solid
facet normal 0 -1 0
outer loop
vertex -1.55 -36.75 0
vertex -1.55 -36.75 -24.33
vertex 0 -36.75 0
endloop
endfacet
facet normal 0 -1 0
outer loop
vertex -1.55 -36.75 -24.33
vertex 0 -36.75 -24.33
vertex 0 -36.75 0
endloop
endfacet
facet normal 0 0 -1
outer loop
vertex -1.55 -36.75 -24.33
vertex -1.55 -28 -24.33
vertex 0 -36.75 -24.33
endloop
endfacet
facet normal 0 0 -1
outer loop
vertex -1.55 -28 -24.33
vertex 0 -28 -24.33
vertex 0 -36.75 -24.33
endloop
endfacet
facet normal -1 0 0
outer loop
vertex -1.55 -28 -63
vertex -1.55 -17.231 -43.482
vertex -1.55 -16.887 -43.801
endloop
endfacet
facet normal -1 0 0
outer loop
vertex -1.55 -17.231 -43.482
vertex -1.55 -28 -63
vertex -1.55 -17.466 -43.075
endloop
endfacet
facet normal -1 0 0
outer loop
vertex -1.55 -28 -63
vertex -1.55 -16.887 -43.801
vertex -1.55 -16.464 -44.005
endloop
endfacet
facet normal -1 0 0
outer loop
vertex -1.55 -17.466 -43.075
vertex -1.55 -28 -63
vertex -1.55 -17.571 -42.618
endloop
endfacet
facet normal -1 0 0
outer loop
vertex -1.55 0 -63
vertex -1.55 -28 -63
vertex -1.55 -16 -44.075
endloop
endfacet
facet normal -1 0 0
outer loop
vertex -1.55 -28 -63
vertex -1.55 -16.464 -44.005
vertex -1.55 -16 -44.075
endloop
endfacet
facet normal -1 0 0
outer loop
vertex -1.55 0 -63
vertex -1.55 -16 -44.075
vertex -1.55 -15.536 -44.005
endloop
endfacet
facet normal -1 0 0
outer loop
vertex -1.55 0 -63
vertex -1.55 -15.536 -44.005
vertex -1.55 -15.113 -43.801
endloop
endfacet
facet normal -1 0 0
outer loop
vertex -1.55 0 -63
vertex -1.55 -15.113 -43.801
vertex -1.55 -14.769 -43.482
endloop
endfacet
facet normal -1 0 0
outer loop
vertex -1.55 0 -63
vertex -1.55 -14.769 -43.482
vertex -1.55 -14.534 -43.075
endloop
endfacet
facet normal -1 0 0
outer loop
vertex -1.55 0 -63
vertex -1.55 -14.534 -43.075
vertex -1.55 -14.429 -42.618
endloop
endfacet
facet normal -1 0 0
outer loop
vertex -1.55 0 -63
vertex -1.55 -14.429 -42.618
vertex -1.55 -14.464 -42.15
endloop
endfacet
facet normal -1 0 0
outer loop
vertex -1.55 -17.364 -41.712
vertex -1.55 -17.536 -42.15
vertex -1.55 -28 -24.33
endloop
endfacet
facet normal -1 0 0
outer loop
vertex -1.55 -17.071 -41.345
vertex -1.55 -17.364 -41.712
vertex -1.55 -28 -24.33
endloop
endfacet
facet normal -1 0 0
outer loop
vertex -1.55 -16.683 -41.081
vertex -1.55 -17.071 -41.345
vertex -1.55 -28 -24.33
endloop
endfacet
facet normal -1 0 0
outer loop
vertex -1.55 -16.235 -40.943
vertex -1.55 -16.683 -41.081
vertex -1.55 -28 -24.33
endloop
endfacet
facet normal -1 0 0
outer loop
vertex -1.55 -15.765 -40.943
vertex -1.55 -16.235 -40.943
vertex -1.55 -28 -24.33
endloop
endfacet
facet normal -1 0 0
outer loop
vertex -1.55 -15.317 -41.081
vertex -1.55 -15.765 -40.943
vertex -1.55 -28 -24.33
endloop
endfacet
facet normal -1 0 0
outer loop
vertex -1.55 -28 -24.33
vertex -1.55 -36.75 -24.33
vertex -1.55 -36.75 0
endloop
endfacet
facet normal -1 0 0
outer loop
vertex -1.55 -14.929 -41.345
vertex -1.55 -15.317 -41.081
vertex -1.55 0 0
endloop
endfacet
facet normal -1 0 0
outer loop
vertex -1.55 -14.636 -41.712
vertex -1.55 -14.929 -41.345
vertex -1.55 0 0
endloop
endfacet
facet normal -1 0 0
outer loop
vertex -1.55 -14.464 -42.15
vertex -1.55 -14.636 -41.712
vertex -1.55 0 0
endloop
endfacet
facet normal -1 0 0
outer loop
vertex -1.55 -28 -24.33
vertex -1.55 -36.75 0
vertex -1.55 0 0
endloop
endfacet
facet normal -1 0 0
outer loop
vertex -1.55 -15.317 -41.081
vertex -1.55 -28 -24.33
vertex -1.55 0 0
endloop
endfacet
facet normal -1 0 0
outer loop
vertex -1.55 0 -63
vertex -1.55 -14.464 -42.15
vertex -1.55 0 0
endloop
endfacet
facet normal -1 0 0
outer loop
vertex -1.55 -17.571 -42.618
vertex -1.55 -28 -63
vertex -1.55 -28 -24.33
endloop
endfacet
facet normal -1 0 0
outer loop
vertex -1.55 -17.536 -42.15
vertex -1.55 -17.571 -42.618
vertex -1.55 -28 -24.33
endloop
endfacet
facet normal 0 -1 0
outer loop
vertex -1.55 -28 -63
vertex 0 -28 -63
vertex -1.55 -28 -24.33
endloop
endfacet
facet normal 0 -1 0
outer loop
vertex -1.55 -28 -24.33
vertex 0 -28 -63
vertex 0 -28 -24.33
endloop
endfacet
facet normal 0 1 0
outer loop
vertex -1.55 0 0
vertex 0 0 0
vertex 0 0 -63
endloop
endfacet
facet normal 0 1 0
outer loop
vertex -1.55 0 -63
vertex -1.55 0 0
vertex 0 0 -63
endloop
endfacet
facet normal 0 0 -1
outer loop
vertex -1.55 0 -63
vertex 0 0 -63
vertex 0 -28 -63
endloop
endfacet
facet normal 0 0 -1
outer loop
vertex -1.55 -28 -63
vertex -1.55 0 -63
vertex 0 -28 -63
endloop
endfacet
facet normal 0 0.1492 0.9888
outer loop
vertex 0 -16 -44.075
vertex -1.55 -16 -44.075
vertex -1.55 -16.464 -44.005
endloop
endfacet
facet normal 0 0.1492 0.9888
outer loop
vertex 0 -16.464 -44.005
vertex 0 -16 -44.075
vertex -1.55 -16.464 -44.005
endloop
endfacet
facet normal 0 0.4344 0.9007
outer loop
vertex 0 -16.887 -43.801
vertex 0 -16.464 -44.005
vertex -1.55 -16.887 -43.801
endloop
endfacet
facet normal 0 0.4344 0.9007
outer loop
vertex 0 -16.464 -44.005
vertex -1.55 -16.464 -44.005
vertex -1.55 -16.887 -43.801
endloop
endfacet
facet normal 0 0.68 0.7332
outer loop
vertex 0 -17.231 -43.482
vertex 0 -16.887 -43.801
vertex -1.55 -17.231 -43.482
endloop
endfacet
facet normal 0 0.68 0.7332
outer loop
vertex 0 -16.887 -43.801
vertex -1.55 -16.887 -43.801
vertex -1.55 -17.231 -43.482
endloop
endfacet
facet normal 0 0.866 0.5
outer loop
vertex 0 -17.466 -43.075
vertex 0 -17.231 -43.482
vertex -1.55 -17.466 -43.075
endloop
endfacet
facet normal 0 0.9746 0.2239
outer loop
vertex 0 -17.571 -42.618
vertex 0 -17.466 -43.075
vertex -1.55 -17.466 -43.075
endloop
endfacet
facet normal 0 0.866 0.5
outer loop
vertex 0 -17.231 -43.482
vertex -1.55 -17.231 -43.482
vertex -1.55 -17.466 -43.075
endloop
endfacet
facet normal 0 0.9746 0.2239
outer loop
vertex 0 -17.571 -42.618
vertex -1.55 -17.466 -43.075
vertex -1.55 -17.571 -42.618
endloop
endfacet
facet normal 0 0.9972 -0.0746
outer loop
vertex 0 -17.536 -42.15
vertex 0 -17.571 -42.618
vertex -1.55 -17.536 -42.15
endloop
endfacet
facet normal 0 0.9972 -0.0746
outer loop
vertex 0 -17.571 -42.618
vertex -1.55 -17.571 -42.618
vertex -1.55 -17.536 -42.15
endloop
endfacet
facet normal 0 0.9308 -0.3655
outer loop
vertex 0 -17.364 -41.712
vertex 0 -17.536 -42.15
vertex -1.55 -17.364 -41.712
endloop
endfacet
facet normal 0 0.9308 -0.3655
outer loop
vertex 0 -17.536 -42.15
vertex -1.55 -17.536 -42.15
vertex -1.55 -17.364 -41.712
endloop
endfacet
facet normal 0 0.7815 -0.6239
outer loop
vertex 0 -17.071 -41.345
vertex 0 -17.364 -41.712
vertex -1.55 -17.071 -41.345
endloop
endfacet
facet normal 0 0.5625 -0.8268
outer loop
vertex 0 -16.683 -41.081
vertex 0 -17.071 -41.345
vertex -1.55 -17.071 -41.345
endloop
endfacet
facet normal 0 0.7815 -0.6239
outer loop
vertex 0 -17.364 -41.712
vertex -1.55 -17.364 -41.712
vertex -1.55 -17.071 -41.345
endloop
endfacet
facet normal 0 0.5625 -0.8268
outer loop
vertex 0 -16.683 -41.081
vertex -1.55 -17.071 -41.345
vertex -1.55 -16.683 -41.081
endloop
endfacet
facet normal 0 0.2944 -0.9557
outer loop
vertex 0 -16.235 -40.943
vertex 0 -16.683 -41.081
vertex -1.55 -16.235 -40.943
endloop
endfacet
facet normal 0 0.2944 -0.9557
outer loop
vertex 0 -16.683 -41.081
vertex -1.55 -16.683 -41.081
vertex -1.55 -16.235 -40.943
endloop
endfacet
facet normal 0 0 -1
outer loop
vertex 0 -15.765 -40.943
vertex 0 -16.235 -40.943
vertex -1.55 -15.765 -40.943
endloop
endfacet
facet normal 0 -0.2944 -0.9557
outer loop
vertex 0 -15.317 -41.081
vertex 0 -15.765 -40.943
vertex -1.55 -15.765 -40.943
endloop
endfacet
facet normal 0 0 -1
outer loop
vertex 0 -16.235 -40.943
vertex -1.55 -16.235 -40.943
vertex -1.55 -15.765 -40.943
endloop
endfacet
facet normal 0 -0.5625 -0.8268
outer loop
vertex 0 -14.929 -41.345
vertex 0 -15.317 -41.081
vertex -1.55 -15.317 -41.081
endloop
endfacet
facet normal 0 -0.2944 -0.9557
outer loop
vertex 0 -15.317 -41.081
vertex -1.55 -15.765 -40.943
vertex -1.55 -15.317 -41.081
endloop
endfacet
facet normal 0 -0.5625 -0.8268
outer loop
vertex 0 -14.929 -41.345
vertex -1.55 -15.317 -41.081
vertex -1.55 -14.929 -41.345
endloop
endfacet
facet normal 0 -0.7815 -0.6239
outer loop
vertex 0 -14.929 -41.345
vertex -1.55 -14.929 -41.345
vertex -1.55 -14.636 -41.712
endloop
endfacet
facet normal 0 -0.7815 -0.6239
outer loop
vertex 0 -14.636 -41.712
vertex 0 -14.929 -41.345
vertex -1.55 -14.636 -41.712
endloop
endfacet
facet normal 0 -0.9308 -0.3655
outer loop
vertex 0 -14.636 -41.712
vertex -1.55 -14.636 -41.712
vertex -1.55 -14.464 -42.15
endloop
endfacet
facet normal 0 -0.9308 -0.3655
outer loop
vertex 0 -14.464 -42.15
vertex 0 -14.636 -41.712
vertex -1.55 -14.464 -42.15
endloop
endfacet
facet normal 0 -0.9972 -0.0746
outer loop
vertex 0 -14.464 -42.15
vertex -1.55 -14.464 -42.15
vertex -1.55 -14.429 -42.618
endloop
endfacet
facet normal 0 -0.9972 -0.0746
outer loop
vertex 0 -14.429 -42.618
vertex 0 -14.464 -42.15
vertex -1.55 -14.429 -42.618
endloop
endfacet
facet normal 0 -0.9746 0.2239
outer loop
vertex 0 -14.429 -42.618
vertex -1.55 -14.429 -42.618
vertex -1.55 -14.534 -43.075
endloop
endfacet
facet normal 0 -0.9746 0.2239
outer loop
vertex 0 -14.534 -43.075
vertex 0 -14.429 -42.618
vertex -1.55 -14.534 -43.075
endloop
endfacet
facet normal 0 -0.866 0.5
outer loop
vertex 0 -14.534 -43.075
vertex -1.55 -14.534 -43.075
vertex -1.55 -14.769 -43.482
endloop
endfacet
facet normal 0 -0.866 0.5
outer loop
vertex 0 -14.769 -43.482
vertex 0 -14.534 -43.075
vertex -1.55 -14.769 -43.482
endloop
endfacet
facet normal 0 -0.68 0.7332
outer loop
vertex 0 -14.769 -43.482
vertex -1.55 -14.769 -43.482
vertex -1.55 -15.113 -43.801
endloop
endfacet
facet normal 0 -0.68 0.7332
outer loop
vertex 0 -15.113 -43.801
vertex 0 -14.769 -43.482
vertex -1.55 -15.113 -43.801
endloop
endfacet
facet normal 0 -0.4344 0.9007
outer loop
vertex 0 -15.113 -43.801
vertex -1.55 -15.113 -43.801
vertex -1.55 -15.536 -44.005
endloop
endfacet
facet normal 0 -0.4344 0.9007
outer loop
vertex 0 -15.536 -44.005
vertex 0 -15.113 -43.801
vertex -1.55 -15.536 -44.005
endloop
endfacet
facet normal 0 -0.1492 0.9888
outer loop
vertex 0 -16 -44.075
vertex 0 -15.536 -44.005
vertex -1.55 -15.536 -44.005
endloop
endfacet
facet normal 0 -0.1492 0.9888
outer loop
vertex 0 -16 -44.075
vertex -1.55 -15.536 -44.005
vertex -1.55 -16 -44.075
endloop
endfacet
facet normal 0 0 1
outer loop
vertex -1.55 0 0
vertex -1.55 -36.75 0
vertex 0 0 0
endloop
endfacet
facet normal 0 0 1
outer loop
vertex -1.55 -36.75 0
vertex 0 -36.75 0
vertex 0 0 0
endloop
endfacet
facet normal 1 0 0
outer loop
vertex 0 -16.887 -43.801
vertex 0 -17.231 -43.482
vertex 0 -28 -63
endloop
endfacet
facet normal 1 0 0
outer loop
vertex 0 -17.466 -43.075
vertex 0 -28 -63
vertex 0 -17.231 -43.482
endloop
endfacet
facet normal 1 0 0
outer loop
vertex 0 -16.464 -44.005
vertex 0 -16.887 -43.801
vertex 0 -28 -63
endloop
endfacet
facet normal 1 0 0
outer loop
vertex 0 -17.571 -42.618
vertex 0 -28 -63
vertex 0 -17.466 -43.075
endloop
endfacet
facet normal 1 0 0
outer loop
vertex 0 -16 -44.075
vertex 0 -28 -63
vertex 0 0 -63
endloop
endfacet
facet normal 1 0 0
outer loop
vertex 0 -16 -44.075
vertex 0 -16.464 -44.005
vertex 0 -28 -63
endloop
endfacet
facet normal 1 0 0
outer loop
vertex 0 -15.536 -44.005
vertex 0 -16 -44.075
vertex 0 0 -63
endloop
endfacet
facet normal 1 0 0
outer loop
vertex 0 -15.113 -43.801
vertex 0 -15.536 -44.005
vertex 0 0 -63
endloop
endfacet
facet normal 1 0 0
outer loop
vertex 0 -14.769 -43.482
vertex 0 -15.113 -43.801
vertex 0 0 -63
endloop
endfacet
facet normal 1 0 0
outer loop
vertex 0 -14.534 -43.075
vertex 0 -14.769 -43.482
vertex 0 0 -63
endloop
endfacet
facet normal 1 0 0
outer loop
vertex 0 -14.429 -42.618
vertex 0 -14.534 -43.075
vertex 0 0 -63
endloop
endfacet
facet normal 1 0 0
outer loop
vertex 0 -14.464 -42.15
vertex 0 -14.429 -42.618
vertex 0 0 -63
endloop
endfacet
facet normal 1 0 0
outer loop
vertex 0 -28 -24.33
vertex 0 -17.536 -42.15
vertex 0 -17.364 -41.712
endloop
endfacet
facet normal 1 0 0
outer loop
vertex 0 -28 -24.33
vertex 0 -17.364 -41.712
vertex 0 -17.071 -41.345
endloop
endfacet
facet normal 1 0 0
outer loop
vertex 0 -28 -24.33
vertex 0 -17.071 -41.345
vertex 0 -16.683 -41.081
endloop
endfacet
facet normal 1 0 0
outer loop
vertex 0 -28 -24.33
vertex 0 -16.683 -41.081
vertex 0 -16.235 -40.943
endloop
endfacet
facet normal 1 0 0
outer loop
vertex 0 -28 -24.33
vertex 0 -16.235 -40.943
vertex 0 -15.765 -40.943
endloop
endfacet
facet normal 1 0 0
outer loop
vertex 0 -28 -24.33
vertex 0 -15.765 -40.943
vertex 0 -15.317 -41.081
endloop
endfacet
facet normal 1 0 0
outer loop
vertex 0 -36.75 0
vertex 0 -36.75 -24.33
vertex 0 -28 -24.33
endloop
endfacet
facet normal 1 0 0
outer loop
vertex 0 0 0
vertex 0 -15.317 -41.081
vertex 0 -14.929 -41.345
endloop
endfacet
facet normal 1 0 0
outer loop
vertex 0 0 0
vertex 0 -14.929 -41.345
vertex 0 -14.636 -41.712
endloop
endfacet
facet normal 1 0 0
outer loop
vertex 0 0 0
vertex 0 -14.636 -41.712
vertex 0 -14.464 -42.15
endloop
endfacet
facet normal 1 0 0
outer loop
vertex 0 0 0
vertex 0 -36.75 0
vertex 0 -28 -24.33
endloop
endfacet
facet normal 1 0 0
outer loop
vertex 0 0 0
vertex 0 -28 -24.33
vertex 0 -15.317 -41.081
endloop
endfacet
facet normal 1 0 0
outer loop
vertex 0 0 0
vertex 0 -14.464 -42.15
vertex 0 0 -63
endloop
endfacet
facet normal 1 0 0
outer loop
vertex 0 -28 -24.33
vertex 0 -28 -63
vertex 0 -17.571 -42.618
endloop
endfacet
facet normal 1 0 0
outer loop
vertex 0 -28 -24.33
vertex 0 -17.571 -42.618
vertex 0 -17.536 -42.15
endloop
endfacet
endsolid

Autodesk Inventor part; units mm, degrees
ref_plane "YZ Plane" through (0, 0, 0) normal (1, 0, 0) x (0, 1, 0)
ref_plane "XZ Plane" through (0, 0, 0) normal (0, 1, 0) x (-1, 0, 0)
ref_plane "XY Plane" through (0, 0, 0) normal (0, 0, 1) x (1, 0, 0)
sketch "Sketch1" plane through (0, 0, 0) normal (1, 0, 0) x (0, 1, 0)
  line L0 (0, 12.6) -> (0, -75.6) projected
  line L1 (-44.1, 0) -> (7.35, 0) projected
  line L2 (0, 0) -> (0, -63)
  line L3 (0, -63) -> (-28, -63)
  line L4 (-28, -63) -> (-28, -24.33)
  line L5 (-28, -24.33) -> (-36.75, -24.33)
  line L6 (-36.75, -24.33) -> (-36.75, 0)
  line L7 (-36.75, 0) -> (0, 0)
  circle A0 centre (-16, -42.5) radius 1.575 construction
  dimension "d0" = 63
  dimension "d1" = 28
  dimension "d2" = 36.75
  dimension "d3" = 24.33
  dimension "d4" = 42.5
  dimension "d5" = 16
  dimension "d6" = 3.15
extrude "Extrusion1" add sketch "Sketch1" against normal blind 1.55
hole "Hole1" at (0, -16, -42.5) direction (-1, 0, 0) diameter 3.15 end through all
properties part number "J010361" material "FR4"
